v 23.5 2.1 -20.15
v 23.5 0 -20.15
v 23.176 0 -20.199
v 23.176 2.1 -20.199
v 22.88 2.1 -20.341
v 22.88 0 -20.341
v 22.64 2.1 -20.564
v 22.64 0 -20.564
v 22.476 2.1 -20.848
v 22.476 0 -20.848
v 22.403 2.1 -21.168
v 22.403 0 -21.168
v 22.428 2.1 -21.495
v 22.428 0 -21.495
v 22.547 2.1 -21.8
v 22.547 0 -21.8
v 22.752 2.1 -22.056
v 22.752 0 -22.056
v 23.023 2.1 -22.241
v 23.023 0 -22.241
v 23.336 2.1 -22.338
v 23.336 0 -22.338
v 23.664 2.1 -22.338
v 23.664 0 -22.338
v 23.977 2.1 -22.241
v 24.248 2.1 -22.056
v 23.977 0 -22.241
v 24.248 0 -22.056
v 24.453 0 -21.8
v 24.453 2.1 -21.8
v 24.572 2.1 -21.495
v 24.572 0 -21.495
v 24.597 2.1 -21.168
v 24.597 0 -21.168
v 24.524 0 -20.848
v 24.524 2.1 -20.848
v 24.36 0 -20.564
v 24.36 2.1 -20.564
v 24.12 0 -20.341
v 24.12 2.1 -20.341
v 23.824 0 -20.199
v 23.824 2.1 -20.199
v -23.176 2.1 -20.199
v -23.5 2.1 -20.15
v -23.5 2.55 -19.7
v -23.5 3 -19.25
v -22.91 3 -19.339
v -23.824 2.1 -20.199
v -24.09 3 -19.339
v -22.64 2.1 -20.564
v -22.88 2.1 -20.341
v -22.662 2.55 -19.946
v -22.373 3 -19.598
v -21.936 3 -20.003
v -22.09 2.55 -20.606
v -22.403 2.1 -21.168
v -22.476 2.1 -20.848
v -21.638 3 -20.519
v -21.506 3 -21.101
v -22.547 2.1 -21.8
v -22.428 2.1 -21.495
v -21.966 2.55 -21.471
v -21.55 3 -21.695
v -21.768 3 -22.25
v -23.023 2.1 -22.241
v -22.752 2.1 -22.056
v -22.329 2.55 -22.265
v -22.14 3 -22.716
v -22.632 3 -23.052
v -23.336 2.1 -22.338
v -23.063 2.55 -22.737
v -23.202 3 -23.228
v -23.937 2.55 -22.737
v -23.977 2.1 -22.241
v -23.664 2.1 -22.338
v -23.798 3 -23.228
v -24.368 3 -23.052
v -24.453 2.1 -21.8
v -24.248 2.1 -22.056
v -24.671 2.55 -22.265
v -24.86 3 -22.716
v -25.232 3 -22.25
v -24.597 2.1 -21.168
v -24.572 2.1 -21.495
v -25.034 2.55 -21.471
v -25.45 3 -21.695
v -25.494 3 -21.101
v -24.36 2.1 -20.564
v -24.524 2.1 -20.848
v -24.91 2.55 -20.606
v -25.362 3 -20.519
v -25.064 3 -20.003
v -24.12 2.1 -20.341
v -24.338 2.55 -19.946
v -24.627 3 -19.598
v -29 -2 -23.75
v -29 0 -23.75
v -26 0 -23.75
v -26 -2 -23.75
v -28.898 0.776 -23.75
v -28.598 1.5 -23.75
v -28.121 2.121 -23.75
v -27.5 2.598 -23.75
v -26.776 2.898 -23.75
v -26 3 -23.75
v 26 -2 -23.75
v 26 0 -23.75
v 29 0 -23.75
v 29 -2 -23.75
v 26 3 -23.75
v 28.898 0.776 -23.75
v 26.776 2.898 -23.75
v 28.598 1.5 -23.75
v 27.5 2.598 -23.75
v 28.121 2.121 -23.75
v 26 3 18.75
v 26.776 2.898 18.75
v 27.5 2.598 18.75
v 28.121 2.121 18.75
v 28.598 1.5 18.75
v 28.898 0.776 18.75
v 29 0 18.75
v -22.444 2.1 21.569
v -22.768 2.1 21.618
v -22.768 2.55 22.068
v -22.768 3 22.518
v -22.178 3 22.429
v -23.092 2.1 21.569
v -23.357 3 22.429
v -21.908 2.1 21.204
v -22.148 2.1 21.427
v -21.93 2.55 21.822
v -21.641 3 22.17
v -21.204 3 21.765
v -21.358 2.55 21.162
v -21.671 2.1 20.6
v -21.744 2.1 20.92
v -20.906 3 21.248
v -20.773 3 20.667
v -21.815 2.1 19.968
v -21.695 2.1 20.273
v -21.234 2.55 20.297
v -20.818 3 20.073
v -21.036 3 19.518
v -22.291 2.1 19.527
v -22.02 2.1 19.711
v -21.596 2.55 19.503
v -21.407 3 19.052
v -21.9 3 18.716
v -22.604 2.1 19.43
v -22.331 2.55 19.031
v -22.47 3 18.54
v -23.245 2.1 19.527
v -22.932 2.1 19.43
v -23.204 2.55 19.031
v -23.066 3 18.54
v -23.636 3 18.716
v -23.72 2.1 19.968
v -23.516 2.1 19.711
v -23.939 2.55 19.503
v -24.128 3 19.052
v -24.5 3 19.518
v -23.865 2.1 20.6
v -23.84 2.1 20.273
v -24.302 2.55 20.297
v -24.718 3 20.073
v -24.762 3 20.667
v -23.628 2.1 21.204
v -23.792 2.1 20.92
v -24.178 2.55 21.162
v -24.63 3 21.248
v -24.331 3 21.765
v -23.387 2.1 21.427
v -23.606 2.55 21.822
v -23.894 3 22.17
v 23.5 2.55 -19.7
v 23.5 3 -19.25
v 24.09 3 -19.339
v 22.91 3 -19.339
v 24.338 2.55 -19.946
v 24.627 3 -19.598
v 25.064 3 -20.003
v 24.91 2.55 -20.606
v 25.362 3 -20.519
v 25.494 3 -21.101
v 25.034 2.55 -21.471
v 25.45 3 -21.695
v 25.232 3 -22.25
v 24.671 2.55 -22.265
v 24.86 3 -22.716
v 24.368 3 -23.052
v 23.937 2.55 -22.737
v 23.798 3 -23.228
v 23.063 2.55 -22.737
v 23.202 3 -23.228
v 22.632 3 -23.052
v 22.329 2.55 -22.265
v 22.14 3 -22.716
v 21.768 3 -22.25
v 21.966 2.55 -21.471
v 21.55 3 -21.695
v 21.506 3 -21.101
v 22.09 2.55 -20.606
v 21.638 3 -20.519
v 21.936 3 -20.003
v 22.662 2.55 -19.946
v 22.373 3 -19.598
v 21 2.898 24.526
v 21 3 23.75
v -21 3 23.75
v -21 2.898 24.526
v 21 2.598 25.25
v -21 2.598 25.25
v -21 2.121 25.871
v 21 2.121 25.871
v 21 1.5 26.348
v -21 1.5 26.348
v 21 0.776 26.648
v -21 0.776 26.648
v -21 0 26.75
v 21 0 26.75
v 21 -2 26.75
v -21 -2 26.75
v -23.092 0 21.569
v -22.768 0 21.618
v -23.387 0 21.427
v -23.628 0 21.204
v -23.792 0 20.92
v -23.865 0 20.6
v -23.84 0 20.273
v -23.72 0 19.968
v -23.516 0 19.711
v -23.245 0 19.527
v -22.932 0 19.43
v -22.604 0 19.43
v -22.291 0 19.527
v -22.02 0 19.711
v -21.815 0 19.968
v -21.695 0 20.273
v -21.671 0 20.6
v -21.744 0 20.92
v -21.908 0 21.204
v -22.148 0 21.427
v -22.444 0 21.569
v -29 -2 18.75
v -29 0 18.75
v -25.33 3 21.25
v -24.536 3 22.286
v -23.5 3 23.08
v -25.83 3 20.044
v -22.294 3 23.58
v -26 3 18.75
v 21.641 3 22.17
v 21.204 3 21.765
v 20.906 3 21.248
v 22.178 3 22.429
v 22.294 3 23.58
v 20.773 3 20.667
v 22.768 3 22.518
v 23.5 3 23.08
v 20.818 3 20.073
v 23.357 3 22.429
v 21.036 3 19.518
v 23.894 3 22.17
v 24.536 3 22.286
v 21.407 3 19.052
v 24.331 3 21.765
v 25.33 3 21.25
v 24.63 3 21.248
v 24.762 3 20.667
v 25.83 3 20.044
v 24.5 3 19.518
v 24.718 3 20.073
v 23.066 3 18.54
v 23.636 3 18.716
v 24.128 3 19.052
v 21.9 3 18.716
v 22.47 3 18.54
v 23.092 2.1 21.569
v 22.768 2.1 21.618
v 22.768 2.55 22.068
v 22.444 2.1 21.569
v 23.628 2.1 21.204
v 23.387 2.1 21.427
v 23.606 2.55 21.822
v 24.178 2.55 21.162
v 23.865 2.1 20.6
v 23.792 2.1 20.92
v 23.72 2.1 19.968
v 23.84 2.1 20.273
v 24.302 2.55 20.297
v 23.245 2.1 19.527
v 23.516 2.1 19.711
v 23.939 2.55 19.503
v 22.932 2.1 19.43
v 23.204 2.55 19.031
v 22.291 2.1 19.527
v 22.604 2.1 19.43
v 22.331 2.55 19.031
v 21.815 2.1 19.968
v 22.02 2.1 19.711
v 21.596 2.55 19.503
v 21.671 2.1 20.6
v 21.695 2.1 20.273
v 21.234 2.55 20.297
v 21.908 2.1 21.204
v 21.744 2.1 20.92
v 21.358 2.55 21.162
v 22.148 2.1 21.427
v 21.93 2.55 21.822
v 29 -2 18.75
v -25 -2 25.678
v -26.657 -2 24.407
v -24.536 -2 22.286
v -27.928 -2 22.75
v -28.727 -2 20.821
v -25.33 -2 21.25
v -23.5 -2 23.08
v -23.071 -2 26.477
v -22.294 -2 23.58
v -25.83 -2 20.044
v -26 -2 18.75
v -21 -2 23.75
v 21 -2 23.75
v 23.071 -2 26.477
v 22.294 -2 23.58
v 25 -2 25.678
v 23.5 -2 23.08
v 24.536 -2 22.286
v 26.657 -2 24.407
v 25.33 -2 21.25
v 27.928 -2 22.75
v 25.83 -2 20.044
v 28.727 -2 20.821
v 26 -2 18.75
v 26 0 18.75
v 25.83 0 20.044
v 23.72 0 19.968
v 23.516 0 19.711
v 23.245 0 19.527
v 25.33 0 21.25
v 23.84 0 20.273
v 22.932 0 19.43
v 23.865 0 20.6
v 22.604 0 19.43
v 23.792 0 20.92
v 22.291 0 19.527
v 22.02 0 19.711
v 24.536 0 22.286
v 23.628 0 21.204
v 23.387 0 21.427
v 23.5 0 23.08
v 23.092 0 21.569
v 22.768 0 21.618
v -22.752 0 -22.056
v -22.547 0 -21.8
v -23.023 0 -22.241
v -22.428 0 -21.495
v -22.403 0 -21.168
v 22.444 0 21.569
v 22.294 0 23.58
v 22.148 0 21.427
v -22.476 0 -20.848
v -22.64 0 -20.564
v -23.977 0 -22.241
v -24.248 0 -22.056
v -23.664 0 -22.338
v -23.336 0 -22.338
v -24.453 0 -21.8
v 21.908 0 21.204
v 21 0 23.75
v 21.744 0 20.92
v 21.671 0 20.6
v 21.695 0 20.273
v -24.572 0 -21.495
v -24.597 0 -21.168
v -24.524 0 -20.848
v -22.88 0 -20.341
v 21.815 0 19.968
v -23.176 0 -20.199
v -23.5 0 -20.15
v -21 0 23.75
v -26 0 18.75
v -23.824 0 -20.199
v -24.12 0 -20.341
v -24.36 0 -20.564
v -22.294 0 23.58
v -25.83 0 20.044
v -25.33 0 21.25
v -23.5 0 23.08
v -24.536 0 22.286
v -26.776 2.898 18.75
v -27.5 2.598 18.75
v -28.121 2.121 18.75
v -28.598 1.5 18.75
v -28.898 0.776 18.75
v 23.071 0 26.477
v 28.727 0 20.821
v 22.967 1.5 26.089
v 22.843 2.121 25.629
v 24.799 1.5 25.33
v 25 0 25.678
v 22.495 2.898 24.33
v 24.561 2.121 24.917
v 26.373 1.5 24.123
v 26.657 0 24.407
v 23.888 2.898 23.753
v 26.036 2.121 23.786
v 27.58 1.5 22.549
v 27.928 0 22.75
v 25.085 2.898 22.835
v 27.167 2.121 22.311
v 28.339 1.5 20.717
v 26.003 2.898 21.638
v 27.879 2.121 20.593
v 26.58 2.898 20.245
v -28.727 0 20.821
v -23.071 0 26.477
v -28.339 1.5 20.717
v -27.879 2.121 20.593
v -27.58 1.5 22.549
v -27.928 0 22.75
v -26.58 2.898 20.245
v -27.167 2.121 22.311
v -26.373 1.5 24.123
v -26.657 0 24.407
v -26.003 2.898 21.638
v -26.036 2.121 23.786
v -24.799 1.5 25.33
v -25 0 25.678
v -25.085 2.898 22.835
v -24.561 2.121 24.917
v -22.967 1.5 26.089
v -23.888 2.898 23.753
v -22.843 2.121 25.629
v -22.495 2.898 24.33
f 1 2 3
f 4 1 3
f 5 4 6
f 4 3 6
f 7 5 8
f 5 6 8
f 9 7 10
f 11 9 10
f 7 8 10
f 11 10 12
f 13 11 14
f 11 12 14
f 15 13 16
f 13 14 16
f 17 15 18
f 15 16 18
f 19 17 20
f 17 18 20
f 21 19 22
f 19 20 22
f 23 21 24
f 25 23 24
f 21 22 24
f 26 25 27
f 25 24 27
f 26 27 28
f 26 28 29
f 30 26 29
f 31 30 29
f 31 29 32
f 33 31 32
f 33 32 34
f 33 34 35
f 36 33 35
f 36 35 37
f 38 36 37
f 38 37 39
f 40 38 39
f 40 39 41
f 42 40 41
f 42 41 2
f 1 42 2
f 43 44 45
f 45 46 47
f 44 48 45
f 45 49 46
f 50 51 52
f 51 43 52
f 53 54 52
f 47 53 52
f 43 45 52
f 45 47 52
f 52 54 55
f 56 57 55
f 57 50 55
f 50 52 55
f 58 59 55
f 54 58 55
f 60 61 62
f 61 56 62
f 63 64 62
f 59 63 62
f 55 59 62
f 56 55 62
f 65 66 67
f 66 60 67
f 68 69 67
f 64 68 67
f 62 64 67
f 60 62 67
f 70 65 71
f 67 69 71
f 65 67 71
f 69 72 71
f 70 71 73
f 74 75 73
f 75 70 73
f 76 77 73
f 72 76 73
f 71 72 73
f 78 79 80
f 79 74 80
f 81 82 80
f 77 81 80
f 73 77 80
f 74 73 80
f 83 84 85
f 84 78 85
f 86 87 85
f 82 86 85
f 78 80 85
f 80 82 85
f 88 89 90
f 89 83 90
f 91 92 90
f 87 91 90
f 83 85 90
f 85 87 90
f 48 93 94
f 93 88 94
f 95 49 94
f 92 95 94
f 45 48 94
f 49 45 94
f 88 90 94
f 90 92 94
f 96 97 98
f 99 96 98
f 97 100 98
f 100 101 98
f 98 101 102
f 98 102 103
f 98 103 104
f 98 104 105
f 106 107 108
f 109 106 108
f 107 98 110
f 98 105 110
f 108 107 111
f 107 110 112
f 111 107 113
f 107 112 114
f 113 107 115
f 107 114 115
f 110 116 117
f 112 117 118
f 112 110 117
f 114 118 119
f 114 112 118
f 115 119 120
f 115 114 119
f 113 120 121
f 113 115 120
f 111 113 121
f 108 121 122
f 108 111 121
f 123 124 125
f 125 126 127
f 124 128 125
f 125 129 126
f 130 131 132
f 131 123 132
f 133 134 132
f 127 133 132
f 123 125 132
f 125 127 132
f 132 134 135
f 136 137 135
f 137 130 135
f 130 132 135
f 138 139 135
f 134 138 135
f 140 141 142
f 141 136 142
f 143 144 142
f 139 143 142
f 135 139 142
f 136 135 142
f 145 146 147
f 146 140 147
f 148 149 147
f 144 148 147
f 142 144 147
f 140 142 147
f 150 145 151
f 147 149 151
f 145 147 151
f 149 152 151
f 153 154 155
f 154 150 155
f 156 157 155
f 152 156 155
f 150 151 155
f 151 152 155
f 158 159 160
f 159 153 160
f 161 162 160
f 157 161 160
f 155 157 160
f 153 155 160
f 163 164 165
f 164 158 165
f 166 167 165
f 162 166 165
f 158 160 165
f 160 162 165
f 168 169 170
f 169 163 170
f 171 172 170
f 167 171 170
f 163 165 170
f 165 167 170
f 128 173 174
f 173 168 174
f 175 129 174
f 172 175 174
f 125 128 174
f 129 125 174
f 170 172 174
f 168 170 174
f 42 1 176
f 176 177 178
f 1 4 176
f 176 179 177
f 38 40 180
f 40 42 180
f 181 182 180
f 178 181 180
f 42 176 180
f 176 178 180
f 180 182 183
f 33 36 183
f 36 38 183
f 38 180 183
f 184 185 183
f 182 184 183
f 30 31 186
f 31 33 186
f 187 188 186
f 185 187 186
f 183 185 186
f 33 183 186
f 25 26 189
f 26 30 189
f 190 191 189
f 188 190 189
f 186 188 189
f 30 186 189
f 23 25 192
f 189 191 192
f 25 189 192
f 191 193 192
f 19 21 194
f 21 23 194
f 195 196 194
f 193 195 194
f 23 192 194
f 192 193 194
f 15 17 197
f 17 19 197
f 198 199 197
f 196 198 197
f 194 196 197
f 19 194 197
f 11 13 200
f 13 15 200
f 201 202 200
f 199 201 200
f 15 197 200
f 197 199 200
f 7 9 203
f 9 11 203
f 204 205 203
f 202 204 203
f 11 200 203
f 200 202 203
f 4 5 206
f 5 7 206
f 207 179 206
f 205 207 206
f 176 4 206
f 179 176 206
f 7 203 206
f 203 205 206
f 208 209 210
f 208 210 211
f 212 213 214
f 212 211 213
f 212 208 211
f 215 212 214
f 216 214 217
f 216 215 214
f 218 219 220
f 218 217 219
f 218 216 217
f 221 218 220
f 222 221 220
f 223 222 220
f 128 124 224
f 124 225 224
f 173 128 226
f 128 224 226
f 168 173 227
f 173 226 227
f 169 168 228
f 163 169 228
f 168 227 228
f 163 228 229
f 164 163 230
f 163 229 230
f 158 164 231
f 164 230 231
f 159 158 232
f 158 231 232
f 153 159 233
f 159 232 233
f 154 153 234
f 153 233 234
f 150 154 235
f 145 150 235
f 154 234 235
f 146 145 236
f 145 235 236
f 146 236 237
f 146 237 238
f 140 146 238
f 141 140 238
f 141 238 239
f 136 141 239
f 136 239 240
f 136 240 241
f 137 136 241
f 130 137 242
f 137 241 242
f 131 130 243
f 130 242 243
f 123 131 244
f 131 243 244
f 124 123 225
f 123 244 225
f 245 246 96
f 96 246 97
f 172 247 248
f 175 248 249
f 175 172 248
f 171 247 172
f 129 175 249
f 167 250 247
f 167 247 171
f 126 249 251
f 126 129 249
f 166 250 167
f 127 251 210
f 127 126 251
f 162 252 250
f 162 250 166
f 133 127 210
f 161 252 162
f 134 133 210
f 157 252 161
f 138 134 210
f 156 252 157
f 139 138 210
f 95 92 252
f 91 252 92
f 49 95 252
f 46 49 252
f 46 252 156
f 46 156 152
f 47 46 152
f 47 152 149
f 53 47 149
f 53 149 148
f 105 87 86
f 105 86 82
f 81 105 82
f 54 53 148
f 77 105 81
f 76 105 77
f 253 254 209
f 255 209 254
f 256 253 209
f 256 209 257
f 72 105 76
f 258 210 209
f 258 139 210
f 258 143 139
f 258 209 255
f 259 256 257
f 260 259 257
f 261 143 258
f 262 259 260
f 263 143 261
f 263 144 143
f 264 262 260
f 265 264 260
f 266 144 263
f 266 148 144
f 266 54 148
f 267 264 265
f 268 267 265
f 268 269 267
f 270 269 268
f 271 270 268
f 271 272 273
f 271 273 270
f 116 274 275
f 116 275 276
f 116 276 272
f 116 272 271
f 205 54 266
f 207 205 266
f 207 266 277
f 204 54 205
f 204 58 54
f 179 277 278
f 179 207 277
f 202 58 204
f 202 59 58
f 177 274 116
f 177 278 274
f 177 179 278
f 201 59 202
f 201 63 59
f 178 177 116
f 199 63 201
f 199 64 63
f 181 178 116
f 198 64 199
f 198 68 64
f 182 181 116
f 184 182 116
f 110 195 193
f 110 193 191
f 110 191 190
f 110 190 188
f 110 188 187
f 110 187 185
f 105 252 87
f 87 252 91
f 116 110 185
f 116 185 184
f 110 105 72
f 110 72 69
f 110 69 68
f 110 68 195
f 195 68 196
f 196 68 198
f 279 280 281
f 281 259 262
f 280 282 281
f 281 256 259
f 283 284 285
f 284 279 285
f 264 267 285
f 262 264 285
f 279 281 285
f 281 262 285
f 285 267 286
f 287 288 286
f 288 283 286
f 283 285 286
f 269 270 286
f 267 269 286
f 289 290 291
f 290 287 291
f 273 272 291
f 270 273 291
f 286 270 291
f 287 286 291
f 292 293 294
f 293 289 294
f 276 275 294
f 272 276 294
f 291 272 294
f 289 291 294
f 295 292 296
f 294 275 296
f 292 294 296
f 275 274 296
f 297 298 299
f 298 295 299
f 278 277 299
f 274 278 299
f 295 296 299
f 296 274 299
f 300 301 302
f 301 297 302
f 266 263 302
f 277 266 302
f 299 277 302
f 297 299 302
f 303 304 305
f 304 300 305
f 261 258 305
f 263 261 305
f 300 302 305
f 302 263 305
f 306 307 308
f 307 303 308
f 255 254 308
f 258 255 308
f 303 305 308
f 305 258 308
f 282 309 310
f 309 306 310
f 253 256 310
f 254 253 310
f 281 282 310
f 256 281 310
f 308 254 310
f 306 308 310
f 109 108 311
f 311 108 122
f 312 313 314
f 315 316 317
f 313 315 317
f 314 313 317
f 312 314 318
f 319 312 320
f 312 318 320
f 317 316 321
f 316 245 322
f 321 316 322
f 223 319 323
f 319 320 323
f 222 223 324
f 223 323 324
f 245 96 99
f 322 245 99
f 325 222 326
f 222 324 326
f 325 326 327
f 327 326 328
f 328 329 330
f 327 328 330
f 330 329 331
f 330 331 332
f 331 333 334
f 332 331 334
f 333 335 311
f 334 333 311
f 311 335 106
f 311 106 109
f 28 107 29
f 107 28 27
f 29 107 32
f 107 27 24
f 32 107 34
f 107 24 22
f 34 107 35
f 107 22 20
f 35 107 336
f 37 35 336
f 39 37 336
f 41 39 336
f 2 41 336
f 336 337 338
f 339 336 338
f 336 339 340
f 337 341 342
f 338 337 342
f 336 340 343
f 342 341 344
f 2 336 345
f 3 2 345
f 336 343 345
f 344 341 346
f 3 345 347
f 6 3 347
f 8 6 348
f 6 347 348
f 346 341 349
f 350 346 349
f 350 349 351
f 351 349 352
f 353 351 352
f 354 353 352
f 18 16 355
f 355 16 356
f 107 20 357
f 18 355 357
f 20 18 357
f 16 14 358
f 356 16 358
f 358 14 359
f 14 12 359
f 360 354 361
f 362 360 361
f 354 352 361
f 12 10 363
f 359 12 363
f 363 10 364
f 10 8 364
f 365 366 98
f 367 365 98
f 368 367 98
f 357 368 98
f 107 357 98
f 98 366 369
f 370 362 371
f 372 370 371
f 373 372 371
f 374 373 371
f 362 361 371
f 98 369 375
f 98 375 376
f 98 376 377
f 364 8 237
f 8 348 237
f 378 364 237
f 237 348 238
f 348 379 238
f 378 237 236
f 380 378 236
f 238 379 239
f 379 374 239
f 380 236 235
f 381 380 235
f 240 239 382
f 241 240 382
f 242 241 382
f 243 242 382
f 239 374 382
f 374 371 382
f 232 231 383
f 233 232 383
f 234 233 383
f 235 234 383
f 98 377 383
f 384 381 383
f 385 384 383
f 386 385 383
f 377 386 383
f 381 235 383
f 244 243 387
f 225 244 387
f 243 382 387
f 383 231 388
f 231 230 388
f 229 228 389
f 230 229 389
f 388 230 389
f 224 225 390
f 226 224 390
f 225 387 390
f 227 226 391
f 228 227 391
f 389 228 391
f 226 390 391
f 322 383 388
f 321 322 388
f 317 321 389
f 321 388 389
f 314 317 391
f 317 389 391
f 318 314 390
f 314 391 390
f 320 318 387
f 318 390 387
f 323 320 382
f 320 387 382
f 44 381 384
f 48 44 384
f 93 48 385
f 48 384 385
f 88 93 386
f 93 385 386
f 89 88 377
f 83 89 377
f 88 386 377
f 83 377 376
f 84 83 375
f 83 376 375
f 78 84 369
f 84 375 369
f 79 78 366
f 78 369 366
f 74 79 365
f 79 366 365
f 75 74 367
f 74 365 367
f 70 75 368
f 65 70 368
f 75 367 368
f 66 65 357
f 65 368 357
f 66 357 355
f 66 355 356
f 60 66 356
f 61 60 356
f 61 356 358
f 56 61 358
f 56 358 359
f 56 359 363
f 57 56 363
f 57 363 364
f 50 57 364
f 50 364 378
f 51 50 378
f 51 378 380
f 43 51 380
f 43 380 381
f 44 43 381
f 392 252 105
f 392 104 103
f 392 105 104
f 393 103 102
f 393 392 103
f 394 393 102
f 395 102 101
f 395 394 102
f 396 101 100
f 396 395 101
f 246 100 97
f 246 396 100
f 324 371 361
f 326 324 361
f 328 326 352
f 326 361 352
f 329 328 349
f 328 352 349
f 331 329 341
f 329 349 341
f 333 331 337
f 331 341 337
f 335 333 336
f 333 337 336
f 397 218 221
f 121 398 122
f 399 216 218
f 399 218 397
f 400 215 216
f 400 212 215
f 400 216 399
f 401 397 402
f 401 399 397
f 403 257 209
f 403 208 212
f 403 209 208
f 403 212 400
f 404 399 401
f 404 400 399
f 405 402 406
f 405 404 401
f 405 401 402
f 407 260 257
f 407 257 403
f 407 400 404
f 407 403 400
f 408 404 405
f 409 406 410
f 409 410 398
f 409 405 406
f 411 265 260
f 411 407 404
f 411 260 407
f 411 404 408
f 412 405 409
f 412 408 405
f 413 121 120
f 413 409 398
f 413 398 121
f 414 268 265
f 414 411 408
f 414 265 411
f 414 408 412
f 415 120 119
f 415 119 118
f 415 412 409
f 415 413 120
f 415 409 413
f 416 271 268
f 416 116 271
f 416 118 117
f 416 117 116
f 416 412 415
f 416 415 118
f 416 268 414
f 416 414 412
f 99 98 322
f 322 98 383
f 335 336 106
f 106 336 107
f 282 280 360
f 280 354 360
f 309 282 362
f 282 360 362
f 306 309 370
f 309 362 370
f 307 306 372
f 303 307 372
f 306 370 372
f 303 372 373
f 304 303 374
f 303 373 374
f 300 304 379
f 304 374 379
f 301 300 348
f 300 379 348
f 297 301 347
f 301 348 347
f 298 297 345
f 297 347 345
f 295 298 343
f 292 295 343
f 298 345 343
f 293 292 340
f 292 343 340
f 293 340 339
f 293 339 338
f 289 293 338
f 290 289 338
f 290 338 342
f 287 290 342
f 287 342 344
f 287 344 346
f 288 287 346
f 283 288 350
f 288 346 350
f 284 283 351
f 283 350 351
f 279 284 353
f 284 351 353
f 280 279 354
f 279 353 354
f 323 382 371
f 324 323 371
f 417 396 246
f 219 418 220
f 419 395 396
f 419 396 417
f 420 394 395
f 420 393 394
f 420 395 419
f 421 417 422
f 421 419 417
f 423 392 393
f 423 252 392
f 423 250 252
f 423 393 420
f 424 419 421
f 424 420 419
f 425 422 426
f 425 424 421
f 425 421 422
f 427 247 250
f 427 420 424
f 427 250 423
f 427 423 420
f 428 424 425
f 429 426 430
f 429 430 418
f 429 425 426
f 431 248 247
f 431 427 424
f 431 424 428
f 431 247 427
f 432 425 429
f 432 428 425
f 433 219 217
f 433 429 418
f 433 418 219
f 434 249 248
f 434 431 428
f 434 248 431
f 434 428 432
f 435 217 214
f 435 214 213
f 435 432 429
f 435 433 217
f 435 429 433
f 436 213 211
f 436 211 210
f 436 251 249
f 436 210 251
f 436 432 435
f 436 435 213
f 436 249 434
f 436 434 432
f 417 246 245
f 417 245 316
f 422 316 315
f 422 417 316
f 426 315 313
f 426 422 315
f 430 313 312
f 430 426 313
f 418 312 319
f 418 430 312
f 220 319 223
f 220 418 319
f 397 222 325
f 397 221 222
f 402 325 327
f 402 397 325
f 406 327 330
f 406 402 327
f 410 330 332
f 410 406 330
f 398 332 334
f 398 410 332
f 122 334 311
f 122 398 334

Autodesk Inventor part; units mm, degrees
ref_plane "YZ Plane" through (0, 0, 0) normal (1, 0, 0) x (0, 1, 0)
ref_plane "XZ Plane" through (0, 0, 0) normal (0, 1, 0) x (-1, 0, 0)
ref_plane "XY Plane" through (0, 0, 0) normal (0, 0, 1) x (1, 0, 0)
sketch "Sketch1" plane through (0, 0, 0) normal (0, 1, 0) x (-1, 0, 0)
  line L0 (-26, 23.75) -> (26, 23.75)
  line L1 (26, 23.75) -> (26, -23.75)
  line L2 (26, -23.75) -> (-26, -23.75)
  line L3 (-26, -23.75) -> (-26, 23.75)
  line L4 (-26, 23.75) -> (26, -23.75) construction
  line L5 (26, 23.75) -> (-26, -23.75) construction
  point P0 (0, 0)
  dimension "d0" = 52
  dimension "d1" = 47.5
extrude "Extrusion1" add sketch "Sketch1" along normal blind 3
fillet "Fillet1" radius 5 2 edges at (26, 1.5, 23.75) (-26, 1.5, 23.75)
sketch "Sketch2" plane through (0, 3, 0) normal (0, 1, 0) x (1, 0, 0)
  arc A0 (-26, -18.75) -> (-21, -23.75) centre (-21, -18.75) ccw projected
  line L0 (-21, -23.75) -> (21, -23.75) projected
  arc A1 (21, -23.75) -> (26, -18.75) centre (21, -18.75) ccw projected
  line L1 (26, -18.75) -> (26, 23.75) projected
  line L2 (26, 23.75) -> (-26, 23.75) projected
  line L3 (-26, 23.75) -> (-26, -18.75) projected
  line L4 (29, 26.75) -> (29, -18.75)
  arc A2 (21, -26.75) -> (29, -18.75) centre (21, -18.75) ccw
  line L5 (21, -26.75) -> (-21, -26.75)
  arc A3 (-29, -18.75) -> (-21, -26.75) centre (-21, -18.75) ccw
  line L6 (-29, -18.75) -> (-29, 26.75)
  line L7 (-29, 26.75) -> (29, 26.75)
  point P0 (0, 0)
  dimension "d5" = 3
extrude "Extrusion2" add sketch "Sketch2" against normal blind 5
sketch "Sketch3" plane through (0, 3, 0) normal (0, 1, 0) x (1, 0, 0)
  line L0 (26, -18.75) -> (26, 23.75) projected
  line L1 (29, 26.75) -> (26, 26.75)
  line L2 (26, 26.75) -> (26, 23.75)
  line L3 (26, 23.75) -> (29, 23.75)
  line L4 (29, 23.75) -> (29, 26.75)
  line L5 (26, 23.75) -> (21, 23.75)
  line L6 (21, 23.75) -> (21, 18.75)
  line L7 (21, 18.75) -> (26, 18.75)
  line L8 (26, 18.75) -> (26, 23.75)
  line L9 (-29, 26.75) -> (-26, 26.75)
  line L10 (-26, 26.75) -> (-26, 23.75)
  line L11 (-26, 23.75) -> (-29, 23.75)
  line L12 (-29, 23.75) -> (-29, 26.75)
  line L13 (-26, 23.75) -> (-21, 23.75)
  line L14 (-21, 23.75) -> (-21, 18.75)
  line L15 (-21, 18.75) -> (-26, 18.75)
  line L16 (-26, 18.75) -> (-26, 23.75)
  arc A0 (-29, -18.75) -> (-21, -26.75) centre (-21, -18.75) ccw projected
  line L17 (21, 18.75) -> (-21, 18.75)
  line L18 (-21, 18.75) -> (-21, -18.75)
  line L19 (-21, -18.75) -> (21, -18.75)
  line L20 (21, -18.75) -> (21, 18.75)
  line L21 (-21, -18.75) -> (-26, -18.75)
  line L22 (-26, -18.75) -> (-26, -23.75)
  line L23 (-26, -23.75) -> (-21, -23.75)
  line L24 (-21, -23.75) -> (-21, -18.75)
  line L25 (-21, -18.75) -> (-24.5355, -22.2855)
  line L26 (-21, -18.75) -> (-16, -18.75) construction
  line L27 (21, -18.75) -> (24.5355, -22.2855)
  line L28 (24.5355, -22.2855) -> (-24.5355, -22.2855)
  line L29 (26, 18.75) -> (21, 23.75)
  line L30 (-21, 23.75) -> (-26, 18.75)
  line L31 (22.7678, -20.5178) -> (-22.7678, -20.5178)
  line L32 (23.5, 21.25) -> (-23.5, 21.25)
  point P0 (0, 0)
  dimension "d8" = 3
  dimension "d9" = 3
  dimension "d10" = 5
  dimension "d11" = 5
  dimension "d12" = 3
  dimension "d13" = 3
  dimension "d14" = 5
  dimension "d15" = 5
  dimension "d16" = 37.5
  dimension "d17" = 5
  dimension "d18" = 5
  dimension "d19" = 5
  dimension "d20" = 135
  dimension "d21" = 5
hole "Hole1" at (-23.5, 3, -21.25) at (23.5, 3, -21.25) at (22.7678, 3, 20.5178) at (-22.7678, 3, 20.5178) direction (0, -1, 0) diameter 2.2 end through all countersink diameter 4 countersink angle 90
fillet "Fillet2" radius 3 5 edges at (26.6569, 3, 24.4069) (0, 3, 26.75) (-26.6569, 3, 24.4069) (-29, 3, -4) (29, 3, -4)
thicken "Thicken1" operation add thickness 3 both sides no extend neighbours yes toward (0, 0, 1) faces at (8.6667, -0.3333, -26.75)
properties part number "Closing_Stepper_2"
